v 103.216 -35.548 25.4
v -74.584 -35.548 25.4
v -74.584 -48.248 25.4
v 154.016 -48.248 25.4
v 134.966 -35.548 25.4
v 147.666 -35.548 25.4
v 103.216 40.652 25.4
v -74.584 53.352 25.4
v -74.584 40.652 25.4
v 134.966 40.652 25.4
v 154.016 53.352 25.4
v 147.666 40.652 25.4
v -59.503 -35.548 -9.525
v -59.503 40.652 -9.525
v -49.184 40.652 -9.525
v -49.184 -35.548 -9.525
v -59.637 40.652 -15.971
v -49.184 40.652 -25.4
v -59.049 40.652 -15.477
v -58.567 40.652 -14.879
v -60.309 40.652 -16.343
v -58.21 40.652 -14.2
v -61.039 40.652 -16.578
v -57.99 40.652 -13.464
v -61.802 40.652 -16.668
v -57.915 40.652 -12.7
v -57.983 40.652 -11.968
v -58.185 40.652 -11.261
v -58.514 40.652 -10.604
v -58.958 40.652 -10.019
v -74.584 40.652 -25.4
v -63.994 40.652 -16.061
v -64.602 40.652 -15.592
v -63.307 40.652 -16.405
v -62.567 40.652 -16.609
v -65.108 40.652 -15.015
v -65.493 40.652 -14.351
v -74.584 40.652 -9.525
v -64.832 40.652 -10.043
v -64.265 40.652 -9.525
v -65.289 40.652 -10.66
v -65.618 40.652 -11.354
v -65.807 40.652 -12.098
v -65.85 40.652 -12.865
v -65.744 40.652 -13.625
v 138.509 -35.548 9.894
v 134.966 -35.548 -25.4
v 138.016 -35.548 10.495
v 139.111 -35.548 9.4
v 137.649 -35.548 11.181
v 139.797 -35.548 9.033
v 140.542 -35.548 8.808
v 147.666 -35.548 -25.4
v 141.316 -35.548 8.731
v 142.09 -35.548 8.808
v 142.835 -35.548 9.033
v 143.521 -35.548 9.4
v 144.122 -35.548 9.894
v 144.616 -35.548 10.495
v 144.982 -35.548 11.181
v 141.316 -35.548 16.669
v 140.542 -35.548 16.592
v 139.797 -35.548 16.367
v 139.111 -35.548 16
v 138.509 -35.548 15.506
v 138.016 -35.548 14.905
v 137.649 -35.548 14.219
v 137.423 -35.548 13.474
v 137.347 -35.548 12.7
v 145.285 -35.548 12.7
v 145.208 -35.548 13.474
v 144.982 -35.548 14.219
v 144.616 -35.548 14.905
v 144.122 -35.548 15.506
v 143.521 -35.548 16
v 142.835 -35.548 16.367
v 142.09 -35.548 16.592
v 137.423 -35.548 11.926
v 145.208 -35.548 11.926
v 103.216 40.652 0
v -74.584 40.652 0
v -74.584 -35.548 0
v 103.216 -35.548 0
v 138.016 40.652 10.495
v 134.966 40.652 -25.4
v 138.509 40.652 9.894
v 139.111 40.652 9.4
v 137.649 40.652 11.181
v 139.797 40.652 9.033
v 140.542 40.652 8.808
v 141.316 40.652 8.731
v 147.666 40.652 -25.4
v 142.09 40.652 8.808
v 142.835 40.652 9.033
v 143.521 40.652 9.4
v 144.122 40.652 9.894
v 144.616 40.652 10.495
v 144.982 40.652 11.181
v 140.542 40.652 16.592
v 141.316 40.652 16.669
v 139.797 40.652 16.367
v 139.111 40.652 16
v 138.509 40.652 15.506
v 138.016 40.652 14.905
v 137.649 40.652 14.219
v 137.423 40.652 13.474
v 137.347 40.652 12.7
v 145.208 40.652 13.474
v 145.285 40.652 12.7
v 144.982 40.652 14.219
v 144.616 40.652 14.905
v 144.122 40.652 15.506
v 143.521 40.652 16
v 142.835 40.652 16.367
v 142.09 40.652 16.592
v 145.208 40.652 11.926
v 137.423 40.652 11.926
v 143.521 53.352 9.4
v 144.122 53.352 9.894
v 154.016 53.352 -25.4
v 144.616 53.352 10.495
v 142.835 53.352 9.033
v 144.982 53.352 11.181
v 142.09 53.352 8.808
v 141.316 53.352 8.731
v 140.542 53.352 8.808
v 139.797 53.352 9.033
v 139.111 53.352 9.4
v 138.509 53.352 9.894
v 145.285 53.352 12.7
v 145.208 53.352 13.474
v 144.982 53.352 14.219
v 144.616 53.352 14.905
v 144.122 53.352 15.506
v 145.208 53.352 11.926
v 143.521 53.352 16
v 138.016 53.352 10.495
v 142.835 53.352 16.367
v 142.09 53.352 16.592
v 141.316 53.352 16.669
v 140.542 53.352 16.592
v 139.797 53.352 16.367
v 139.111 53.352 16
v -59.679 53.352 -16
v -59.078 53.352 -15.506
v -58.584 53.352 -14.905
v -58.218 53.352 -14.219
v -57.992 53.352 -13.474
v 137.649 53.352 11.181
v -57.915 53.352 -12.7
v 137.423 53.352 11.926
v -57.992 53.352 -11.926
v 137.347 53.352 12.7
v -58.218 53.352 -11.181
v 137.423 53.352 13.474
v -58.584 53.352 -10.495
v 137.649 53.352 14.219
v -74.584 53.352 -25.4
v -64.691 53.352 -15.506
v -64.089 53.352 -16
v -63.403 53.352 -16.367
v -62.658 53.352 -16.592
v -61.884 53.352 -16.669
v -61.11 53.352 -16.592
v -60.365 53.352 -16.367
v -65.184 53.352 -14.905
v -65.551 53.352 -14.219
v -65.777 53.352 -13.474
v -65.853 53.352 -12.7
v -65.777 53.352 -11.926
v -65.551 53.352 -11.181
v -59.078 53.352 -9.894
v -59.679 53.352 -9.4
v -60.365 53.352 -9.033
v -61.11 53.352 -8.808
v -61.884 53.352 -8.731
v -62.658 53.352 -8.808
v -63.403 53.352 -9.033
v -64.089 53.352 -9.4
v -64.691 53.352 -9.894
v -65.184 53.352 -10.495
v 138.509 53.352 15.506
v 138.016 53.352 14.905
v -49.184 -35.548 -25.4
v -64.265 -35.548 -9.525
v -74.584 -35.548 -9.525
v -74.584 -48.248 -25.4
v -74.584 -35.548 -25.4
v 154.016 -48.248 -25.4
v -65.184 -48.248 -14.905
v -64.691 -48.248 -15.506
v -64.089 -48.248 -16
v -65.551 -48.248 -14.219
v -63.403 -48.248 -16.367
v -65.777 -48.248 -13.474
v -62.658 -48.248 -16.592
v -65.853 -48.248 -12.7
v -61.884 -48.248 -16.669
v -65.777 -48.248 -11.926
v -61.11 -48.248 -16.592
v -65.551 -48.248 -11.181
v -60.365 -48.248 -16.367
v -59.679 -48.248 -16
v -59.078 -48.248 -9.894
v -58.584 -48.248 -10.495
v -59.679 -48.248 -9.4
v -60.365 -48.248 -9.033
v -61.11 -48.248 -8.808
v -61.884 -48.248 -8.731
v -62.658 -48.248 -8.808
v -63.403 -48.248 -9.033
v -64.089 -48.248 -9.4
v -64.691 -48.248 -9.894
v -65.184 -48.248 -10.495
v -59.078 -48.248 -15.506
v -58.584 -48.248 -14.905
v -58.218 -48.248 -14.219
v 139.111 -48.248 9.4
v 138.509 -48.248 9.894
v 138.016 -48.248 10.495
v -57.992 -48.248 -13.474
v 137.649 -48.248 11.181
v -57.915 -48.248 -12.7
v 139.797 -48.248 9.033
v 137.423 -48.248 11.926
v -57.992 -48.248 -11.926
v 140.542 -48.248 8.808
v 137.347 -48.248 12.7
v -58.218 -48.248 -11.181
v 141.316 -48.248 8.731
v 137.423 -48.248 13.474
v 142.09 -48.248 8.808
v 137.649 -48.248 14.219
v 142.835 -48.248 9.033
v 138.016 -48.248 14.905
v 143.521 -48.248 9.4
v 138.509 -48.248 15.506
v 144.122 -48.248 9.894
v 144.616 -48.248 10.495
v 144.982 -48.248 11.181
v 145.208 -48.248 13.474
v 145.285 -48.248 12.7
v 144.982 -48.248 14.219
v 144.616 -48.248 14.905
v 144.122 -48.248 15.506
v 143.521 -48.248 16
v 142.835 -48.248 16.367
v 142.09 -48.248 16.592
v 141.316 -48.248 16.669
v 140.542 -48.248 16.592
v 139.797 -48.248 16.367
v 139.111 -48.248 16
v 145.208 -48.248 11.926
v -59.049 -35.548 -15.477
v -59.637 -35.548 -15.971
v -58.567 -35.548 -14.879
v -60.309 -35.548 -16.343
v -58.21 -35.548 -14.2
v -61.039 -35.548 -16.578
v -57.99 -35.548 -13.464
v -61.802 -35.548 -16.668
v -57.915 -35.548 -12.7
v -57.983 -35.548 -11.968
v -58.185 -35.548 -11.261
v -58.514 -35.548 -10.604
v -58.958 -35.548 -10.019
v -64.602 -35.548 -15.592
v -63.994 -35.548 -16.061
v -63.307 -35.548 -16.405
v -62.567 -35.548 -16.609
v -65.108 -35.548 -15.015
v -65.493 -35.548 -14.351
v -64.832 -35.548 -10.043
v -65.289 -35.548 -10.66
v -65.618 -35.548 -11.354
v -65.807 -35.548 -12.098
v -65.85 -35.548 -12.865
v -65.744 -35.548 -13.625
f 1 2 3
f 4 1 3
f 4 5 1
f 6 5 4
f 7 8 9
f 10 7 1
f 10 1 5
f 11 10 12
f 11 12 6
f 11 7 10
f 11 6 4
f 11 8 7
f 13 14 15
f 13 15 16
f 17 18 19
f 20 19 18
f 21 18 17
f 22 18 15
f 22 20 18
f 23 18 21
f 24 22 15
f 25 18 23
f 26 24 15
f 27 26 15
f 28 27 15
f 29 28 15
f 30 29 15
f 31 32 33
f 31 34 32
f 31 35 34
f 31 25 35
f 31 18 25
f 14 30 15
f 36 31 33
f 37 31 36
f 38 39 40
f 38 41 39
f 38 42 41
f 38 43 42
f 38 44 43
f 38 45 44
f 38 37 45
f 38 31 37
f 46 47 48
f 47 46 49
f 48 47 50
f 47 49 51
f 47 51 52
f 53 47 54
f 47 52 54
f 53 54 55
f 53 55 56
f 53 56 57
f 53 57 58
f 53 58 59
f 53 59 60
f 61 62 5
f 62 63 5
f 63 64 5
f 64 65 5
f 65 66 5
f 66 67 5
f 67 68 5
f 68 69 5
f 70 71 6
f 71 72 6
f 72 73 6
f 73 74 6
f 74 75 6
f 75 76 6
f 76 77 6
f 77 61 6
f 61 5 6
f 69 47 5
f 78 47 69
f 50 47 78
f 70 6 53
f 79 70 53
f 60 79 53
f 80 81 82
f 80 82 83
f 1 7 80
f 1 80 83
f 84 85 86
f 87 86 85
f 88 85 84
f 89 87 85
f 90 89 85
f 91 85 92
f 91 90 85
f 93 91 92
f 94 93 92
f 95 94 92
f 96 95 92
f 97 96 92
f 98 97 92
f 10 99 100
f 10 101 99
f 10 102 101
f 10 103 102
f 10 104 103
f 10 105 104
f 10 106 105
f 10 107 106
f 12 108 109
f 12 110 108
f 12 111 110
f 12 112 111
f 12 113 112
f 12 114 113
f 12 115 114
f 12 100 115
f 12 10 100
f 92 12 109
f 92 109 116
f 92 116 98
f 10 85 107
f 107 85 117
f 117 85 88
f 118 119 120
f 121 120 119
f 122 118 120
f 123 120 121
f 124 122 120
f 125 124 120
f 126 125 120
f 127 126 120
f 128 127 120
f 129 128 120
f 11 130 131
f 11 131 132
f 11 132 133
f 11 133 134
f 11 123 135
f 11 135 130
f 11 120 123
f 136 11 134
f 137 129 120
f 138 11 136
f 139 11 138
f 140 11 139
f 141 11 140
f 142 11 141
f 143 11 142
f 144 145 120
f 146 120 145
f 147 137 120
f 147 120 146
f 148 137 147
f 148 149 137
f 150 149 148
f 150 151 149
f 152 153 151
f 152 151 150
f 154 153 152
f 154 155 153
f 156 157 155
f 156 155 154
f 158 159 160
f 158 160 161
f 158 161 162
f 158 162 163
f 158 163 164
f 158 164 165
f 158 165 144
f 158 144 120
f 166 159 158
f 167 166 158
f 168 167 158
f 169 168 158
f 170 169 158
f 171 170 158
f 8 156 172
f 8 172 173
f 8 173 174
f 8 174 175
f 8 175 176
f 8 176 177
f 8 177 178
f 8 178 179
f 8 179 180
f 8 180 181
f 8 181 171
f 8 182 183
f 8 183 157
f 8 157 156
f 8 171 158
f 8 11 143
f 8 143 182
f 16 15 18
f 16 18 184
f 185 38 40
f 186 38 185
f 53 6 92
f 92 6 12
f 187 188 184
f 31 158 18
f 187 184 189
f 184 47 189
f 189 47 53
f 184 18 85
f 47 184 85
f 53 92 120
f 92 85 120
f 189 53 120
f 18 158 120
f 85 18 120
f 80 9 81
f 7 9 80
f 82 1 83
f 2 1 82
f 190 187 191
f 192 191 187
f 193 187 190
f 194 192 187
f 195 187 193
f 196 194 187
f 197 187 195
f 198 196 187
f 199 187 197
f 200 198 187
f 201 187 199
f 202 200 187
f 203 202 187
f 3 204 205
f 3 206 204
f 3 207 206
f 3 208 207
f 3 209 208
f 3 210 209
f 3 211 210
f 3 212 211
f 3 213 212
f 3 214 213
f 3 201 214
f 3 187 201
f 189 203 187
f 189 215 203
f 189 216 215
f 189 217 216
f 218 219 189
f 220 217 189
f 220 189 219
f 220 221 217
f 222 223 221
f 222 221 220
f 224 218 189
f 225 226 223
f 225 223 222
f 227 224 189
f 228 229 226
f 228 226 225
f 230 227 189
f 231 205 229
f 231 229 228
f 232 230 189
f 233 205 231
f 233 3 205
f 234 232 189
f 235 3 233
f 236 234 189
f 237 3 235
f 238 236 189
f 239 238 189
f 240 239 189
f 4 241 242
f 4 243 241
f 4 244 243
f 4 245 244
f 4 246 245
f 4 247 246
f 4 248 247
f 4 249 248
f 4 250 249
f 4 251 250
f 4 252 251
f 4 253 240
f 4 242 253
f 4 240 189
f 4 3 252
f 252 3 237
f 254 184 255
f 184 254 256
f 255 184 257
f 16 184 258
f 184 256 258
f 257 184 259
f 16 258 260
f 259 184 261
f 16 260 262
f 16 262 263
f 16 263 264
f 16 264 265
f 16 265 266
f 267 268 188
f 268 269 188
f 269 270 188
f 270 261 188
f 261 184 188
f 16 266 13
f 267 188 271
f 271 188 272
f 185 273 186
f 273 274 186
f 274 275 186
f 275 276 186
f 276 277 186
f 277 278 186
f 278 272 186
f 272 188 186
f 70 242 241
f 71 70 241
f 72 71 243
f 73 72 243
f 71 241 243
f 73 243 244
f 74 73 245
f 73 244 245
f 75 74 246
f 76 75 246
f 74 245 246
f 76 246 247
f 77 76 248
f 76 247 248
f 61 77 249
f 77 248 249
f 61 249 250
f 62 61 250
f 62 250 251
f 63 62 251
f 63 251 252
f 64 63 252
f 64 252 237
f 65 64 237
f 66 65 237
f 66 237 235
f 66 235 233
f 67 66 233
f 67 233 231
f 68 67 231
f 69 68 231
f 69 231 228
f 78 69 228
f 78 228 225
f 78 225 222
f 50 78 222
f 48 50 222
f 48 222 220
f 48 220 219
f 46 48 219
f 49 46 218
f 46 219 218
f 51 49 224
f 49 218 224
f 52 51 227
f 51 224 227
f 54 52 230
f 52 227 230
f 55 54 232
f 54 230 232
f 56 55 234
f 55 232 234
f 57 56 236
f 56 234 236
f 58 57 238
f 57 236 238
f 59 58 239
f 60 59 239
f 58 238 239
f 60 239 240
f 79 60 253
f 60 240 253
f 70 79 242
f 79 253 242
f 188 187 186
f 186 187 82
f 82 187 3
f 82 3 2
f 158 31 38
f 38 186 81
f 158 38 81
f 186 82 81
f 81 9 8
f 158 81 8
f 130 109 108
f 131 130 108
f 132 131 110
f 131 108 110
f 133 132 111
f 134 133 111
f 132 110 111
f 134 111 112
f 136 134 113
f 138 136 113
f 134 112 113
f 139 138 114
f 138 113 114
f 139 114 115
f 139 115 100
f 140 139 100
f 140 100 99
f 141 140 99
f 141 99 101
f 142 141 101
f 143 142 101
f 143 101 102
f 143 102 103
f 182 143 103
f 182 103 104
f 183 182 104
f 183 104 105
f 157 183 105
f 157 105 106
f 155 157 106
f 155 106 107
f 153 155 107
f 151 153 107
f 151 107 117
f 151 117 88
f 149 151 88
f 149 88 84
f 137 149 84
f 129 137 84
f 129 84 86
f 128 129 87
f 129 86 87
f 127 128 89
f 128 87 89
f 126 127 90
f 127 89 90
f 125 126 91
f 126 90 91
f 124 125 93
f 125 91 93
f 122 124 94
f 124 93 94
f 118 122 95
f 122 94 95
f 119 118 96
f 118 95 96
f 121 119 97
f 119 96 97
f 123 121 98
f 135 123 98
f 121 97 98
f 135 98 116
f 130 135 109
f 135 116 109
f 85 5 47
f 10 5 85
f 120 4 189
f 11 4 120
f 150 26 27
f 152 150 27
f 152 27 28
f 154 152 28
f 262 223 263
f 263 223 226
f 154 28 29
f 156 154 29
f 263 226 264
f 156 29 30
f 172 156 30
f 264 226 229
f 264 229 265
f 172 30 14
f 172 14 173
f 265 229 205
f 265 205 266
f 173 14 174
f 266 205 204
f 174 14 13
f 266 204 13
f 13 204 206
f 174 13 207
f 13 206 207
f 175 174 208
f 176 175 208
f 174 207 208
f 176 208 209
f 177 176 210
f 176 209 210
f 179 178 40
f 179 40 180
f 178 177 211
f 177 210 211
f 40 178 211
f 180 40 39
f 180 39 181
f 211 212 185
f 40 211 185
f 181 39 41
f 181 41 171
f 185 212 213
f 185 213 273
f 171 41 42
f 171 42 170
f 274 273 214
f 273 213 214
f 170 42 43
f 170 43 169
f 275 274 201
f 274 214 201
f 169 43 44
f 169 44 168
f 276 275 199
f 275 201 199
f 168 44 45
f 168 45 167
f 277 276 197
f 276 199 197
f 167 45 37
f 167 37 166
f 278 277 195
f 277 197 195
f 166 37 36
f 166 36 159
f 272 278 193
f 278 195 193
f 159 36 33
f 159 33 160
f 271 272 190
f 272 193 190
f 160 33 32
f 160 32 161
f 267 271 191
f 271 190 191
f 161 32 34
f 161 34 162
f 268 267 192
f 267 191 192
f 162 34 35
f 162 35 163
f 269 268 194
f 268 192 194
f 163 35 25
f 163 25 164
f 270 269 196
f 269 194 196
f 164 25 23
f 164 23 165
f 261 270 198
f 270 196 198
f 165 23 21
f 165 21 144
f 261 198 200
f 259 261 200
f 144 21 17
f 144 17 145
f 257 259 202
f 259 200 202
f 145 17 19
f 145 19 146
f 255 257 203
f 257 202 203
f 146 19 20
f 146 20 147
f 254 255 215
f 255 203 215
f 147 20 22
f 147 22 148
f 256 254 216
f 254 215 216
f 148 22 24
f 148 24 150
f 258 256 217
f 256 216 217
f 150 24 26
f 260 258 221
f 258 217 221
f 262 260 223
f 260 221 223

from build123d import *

# Parameters (mm, degrees)
F0_W     = 12.7
F0_H     = 76.2
F1_DEPTH = 25.4
F0_W_2   = 177.8
F2_DEPTH = 25.4
F3_R     = 3.96875
F4_DEPTH = 254
F5_R     = 3.96875
F6_DEPTH = 152.4
F7_W     = 76.2
F7_H     = 15.875
F8_DEPTH = 25.4


with BuildPart() as f1:
    # F0 (on Top) → F1 (new body, symmetric)
    with BuildSketch(Plane.XY):
        Polygon((154.0158234471, 53.3519236594), (-74.5841765529, 53.3519236594), (-74.5841765529, 40.6519236594), (103.2158234471, 40.6519236594), (103.2158234471, -35.5480763406), (-74.5841765529, -35.5480763406), (-74.5841765529, -48.2480763406), (154.0158234471, -48.2480763406), align=None)
        with Locations((141.3158234471, 2.5519236594)):
            Rectangle(F0_W, F0_H, mode=Mode.SUBTRACT)
    extrude(amount=F1_DEPTH, both=True)

    # F0 (on Top) → F2 (join)
    with BuildSketch(Plane.XY):
        with Locations((14.3158234471, 2.5519236594)):
            Rectangle(F0_W_2, F0_H)
    extrude(amount=-F2_DEPTH)

    # F3 (on face) → F4 (cut)
    with BuildSketch(Plane.XZ.offset(48.2480763406)):
        with Locations((141.3158234471, 12.7)):
            Circle(F3_R)
    extrude(amount=-F4_DEPTH, mode=Mode.SUBTRACT)

    # F5 (on face) → F6 (cut)
    with BuildSketch(Plane.XZ.offset(48.2480763406)):
        with Locations((-61.8841765529, -12.7)):
            Circle(F5_R)
    extrude(amount=-F6_DEPTH, mode=Mode.SUBTRACT)

    # F7 (on face) → F8 (cut)
    with BuildSketch(Plane(origin=(-74.5841765529, 0, 0), x_dir=(0, -1, 0), z_dir=(-1, 0, 0))):
        with Locations((-2.5519236594, -17.4625)):
            Rectangle(F7_W, F7_H)
    extrude(amount=-F8_DEPTH, mode=Mode.SUBTRACT)


solid = f1.part
